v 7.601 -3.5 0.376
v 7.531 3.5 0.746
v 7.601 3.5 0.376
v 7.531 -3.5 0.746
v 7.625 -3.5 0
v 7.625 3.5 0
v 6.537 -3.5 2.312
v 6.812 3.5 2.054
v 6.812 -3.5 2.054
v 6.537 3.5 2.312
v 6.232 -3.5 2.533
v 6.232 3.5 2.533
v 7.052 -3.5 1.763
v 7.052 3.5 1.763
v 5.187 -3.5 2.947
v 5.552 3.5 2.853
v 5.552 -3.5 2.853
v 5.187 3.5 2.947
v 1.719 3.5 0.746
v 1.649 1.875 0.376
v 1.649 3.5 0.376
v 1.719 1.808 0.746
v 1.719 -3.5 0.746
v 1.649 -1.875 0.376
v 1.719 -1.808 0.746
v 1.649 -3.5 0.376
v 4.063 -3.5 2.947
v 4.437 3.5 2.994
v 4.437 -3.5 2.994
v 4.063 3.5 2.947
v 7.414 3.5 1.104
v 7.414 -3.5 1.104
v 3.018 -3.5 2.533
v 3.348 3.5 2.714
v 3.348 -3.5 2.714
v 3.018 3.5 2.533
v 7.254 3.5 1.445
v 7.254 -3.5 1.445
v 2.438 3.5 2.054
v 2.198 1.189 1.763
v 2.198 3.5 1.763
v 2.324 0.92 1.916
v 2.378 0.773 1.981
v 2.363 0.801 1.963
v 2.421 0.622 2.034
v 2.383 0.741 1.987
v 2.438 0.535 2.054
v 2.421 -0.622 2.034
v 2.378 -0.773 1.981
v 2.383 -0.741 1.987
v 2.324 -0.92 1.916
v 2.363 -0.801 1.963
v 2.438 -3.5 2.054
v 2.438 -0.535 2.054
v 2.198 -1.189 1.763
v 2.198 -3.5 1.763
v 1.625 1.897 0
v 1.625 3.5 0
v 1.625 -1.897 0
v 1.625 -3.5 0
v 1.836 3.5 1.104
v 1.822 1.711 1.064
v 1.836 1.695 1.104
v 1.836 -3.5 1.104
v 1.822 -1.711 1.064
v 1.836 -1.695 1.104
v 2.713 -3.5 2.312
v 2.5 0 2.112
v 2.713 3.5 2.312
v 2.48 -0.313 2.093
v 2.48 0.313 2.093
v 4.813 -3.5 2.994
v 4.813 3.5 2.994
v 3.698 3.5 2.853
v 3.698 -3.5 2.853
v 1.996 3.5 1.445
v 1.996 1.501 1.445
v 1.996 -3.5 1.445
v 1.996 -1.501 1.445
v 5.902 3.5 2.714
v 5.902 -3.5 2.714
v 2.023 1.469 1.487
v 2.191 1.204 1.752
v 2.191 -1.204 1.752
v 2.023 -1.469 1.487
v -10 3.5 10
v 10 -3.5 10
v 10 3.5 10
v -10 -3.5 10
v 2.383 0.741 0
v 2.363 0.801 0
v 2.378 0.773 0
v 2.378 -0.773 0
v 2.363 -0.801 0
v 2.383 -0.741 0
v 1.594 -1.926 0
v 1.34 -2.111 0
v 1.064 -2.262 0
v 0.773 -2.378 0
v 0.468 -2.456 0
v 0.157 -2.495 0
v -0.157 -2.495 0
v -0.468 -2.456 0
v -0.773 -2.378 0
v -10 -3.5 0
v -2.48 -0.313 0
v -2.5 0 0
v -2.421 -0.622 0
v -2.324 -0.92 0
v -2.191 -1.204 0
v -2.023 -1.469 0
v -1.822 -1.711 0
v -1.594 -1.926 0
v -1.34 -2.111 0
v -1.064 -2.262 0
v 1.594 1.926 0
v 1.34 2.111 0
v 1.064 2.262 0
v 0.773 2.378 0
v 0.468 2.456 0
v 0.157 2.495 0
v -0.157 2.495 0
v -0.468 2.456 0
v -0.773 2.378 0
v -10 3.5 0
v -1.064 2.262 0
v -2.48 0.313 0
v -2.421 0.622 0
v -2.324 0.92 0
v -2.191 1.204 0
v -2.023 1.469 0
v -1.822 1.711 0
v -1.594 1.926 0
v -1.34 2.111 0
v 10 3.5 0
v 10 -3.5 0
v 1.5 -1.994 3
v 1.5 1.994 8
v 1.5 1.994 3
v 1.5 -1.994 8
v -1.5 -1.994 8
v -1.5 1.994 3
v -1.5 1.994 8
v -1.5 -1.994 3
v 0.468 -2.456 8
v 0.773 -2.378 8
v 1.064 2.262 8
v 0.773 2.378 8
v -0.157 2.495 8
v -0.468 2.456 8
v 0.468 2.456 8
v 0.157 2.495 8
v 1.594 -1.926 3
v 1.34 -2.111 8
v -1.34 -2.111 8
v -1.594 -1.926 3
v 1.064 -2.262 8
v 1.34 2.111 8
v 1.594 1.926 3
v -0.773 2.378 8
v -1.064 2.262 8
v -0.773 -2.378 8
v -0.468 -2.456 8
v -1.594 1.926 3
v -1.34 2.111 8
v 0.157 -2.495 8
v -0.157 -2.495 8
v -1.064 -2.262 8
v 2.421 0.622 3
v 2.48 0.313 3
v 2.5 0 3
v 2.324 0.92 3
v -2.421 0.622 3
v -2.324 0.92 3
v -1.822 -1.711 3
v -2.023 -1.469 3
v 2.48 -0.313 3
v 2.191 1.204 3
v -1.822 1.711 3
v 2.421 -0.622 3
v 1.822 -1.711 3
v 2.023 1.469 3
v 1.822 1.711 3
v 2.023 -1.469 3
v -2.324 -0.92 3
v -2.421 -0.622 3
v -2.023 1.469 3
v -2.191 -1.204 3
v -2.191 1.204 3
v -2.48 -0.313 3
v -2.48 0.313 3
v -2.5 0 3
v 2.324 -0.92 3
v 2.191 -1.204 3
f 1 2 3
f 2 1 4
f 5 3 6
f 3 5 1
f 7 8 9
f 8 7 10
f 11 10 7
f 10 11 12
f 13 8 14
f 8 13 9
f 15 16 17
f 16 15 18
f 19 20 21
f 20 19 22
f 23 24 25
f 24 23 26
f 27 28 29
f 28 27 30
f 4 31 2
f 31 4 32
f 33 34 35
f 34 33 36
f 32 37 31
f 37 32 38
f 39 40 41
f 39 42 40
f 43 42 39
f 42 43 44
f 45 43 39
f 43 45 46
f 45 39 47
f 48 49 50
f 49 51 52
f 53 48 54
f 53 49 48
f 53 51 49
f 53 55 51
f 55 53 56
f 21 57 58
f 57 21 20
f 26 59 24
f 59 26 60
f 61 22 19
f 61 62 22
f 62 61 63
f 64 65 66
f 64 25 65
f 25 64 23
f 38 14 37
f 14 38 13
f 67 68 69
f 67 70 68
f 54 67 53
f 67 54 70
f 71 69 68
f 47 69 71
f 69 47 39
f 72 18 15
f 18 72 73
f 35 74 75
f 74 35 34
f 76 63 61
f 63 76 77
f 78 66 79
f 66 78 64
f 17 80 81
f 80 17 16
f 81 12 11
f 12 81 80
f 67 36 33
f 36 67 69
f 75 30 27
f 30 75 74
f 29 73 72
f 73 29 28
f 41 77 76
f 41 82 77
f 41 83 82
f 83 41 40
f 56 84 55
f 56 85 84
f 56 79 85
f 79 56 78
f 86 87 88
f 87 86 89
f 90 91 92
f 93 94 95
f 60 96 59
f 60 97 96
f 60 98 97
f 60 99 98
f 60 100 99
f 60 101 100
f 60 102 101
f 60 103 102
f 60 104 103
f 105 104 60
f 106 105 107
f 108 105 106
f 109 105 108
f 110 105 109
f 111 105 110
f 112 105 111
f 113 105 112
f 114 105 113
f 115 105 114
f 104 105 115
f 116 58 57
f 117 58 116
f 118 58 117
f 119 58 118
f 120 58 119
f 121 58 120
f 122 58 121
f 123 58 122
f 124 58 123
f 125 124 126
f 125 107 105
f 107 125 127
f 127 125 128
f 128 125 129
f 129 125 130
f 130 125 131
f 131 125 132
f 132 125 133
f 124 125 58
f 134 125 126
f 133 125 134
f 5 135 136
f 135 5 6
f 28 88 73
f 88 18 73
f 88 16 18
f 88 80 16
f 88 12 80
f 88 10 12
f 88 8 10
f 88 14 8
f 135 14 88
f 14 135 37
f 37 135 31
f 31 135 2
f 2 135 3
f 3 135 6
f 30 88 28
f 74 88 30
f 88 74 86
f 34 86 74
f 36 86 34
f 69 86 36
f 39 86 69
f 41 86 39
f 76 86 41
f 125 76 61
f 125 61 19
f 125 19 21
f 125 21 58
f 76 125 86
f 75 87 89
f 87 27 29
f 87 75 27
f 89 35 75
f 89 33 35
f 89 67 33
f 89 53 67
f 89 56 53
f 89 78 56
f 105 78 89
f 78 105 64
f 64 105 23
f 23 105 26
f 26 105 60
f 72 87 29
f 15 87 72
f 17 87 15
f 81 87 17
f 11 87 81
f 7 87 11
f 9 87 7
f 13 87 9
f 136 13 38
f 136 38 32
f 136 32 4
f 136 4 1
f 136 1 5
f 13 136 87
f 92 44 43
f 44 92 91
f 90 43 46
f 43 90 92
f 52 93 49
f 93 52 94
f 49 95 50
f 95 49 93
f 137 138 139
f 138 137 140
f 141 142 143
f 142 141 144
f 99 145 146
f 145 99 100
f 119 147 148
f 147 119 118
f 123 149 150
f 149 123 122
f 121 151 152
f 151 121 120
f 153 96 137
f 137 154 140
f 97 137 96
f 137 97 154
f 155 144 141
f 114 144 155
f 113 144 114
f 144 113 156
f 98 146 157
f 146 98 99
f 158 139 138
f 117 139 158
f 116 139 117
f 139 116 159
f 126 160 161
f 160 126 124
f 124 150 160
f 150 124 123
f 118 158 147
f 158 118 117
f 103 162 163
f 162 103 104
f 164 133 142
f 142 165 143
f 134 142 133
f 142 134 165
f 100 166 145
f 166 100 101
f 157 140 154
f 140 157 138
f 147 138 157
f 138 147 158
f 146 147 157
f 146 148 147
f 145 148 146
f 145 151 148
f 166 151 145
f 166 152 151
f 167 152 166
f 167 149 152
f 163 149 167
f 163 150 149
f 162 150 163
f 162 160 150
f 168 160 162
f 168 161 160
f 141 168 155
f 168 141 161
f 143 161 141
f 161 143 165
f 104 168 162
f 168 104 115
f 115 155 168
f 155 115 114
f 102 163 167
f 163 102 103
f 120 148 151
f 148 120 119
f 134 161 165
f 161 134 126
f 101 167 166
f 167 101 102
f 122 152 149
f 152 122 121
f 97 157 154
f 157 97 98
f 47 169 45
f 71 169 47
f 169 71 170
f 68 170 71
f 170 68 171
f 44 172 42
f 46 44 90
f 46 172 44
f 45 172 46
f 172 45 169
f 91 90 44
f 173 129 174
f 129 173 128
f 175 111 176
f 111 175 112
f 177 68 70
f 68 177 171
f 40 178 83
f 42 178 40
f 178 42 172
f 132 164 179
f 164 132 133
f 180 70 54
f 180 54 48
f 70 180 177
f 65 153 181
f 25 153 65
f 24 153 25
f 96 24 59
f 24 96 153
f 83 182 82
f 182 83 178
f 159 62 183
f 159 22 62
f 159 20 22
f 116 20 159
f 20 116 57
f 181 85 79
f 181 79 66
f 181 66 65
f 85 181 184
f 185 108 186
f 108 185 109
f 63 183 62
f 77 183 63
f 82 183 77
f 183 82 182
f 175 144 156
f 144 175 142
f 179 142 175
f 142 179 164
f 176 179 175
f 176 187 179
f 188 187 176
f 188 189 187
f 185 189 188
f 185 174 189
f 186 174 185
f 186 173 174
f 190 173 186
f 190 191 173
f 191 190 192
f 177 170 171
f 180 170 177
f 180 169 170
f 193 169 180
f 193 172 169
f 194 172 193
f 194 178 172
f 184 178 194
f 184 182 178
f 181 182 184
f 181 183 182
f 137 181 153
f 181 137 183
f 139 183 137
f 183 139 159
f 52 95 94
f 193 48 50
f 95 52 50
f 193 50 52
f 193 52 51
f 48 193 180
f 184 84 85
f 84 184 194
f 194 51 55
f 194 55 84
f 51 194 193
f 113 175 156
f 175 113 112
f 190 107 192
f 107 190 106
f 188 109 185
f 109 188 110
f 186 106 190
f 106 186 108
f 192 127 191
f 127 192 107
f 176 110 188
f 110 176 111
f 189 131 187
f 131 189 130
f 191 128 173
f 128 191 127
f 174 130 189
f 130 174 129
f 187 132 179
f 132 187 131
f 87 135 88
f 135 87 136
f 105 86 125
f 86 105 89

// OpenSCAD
//Main plate geometry
main_base_thickness = 5;
main_base_r = 90;

//Main ring geometry
main_ring_outer_r = 100;
main_ring_inner_r = 95;
main_ring_h = 60;
ring_clearance = 5;

//Motor hole properties
axel_to_screw_centerline_dist = 8;
screwhole_to_screwhole_dist = 35;
axel_plug_r = 4.75;
axel_base_r = 5/2;
axel_tip_w = 3;


//Arm geometry
arm_length = 2*main_ring_inner_r - ring_clearance;
arm_width = 7;
groove_r = 3;
n_grooves = 10;

//Axel geometry
axel_r = 5/2;
axel_w = 3;
axel_h = 8;
axel_small_h = 3;

//Connector geometry
connector_r = axel_r;
connector_h = 10;

intersection(){

    difference(){
        union(){
            //Grooved arm
            difference(){
                //Main arm
                translate([-arm_length/2, -arm_width/2, 0]){
                    
                    cube([arm_length, arm_width, 10]);
                }    

                //Grooves
                translate([arm_length/(4*n_grooves), arm_width, 0]){
                    for (i = [0:n_grooves]){
                        translate([i*arm_length/(2*n_grooves), 0, 0,]){
                            rotate([90, 0, 0]) cylinder(h=2*arm_width, r=groove_r, $fn=50);  
                        }
                    }
                }
                  
            }
            
            //Connector
            cylinder(h=connector_h, r=connector_r, $fn=20);


        }
        
        //Connector hole
        cylinder(h=axel_small_h, r=axel_r, $fn=50);
        
        
        intersection(){
            cube([axel_w, 20,20],center=true);
            cylinder(h=axel_h, r=axel_r, $fn=50);
        }
        
    }


cube([20, 20, 50], center=true);

}
